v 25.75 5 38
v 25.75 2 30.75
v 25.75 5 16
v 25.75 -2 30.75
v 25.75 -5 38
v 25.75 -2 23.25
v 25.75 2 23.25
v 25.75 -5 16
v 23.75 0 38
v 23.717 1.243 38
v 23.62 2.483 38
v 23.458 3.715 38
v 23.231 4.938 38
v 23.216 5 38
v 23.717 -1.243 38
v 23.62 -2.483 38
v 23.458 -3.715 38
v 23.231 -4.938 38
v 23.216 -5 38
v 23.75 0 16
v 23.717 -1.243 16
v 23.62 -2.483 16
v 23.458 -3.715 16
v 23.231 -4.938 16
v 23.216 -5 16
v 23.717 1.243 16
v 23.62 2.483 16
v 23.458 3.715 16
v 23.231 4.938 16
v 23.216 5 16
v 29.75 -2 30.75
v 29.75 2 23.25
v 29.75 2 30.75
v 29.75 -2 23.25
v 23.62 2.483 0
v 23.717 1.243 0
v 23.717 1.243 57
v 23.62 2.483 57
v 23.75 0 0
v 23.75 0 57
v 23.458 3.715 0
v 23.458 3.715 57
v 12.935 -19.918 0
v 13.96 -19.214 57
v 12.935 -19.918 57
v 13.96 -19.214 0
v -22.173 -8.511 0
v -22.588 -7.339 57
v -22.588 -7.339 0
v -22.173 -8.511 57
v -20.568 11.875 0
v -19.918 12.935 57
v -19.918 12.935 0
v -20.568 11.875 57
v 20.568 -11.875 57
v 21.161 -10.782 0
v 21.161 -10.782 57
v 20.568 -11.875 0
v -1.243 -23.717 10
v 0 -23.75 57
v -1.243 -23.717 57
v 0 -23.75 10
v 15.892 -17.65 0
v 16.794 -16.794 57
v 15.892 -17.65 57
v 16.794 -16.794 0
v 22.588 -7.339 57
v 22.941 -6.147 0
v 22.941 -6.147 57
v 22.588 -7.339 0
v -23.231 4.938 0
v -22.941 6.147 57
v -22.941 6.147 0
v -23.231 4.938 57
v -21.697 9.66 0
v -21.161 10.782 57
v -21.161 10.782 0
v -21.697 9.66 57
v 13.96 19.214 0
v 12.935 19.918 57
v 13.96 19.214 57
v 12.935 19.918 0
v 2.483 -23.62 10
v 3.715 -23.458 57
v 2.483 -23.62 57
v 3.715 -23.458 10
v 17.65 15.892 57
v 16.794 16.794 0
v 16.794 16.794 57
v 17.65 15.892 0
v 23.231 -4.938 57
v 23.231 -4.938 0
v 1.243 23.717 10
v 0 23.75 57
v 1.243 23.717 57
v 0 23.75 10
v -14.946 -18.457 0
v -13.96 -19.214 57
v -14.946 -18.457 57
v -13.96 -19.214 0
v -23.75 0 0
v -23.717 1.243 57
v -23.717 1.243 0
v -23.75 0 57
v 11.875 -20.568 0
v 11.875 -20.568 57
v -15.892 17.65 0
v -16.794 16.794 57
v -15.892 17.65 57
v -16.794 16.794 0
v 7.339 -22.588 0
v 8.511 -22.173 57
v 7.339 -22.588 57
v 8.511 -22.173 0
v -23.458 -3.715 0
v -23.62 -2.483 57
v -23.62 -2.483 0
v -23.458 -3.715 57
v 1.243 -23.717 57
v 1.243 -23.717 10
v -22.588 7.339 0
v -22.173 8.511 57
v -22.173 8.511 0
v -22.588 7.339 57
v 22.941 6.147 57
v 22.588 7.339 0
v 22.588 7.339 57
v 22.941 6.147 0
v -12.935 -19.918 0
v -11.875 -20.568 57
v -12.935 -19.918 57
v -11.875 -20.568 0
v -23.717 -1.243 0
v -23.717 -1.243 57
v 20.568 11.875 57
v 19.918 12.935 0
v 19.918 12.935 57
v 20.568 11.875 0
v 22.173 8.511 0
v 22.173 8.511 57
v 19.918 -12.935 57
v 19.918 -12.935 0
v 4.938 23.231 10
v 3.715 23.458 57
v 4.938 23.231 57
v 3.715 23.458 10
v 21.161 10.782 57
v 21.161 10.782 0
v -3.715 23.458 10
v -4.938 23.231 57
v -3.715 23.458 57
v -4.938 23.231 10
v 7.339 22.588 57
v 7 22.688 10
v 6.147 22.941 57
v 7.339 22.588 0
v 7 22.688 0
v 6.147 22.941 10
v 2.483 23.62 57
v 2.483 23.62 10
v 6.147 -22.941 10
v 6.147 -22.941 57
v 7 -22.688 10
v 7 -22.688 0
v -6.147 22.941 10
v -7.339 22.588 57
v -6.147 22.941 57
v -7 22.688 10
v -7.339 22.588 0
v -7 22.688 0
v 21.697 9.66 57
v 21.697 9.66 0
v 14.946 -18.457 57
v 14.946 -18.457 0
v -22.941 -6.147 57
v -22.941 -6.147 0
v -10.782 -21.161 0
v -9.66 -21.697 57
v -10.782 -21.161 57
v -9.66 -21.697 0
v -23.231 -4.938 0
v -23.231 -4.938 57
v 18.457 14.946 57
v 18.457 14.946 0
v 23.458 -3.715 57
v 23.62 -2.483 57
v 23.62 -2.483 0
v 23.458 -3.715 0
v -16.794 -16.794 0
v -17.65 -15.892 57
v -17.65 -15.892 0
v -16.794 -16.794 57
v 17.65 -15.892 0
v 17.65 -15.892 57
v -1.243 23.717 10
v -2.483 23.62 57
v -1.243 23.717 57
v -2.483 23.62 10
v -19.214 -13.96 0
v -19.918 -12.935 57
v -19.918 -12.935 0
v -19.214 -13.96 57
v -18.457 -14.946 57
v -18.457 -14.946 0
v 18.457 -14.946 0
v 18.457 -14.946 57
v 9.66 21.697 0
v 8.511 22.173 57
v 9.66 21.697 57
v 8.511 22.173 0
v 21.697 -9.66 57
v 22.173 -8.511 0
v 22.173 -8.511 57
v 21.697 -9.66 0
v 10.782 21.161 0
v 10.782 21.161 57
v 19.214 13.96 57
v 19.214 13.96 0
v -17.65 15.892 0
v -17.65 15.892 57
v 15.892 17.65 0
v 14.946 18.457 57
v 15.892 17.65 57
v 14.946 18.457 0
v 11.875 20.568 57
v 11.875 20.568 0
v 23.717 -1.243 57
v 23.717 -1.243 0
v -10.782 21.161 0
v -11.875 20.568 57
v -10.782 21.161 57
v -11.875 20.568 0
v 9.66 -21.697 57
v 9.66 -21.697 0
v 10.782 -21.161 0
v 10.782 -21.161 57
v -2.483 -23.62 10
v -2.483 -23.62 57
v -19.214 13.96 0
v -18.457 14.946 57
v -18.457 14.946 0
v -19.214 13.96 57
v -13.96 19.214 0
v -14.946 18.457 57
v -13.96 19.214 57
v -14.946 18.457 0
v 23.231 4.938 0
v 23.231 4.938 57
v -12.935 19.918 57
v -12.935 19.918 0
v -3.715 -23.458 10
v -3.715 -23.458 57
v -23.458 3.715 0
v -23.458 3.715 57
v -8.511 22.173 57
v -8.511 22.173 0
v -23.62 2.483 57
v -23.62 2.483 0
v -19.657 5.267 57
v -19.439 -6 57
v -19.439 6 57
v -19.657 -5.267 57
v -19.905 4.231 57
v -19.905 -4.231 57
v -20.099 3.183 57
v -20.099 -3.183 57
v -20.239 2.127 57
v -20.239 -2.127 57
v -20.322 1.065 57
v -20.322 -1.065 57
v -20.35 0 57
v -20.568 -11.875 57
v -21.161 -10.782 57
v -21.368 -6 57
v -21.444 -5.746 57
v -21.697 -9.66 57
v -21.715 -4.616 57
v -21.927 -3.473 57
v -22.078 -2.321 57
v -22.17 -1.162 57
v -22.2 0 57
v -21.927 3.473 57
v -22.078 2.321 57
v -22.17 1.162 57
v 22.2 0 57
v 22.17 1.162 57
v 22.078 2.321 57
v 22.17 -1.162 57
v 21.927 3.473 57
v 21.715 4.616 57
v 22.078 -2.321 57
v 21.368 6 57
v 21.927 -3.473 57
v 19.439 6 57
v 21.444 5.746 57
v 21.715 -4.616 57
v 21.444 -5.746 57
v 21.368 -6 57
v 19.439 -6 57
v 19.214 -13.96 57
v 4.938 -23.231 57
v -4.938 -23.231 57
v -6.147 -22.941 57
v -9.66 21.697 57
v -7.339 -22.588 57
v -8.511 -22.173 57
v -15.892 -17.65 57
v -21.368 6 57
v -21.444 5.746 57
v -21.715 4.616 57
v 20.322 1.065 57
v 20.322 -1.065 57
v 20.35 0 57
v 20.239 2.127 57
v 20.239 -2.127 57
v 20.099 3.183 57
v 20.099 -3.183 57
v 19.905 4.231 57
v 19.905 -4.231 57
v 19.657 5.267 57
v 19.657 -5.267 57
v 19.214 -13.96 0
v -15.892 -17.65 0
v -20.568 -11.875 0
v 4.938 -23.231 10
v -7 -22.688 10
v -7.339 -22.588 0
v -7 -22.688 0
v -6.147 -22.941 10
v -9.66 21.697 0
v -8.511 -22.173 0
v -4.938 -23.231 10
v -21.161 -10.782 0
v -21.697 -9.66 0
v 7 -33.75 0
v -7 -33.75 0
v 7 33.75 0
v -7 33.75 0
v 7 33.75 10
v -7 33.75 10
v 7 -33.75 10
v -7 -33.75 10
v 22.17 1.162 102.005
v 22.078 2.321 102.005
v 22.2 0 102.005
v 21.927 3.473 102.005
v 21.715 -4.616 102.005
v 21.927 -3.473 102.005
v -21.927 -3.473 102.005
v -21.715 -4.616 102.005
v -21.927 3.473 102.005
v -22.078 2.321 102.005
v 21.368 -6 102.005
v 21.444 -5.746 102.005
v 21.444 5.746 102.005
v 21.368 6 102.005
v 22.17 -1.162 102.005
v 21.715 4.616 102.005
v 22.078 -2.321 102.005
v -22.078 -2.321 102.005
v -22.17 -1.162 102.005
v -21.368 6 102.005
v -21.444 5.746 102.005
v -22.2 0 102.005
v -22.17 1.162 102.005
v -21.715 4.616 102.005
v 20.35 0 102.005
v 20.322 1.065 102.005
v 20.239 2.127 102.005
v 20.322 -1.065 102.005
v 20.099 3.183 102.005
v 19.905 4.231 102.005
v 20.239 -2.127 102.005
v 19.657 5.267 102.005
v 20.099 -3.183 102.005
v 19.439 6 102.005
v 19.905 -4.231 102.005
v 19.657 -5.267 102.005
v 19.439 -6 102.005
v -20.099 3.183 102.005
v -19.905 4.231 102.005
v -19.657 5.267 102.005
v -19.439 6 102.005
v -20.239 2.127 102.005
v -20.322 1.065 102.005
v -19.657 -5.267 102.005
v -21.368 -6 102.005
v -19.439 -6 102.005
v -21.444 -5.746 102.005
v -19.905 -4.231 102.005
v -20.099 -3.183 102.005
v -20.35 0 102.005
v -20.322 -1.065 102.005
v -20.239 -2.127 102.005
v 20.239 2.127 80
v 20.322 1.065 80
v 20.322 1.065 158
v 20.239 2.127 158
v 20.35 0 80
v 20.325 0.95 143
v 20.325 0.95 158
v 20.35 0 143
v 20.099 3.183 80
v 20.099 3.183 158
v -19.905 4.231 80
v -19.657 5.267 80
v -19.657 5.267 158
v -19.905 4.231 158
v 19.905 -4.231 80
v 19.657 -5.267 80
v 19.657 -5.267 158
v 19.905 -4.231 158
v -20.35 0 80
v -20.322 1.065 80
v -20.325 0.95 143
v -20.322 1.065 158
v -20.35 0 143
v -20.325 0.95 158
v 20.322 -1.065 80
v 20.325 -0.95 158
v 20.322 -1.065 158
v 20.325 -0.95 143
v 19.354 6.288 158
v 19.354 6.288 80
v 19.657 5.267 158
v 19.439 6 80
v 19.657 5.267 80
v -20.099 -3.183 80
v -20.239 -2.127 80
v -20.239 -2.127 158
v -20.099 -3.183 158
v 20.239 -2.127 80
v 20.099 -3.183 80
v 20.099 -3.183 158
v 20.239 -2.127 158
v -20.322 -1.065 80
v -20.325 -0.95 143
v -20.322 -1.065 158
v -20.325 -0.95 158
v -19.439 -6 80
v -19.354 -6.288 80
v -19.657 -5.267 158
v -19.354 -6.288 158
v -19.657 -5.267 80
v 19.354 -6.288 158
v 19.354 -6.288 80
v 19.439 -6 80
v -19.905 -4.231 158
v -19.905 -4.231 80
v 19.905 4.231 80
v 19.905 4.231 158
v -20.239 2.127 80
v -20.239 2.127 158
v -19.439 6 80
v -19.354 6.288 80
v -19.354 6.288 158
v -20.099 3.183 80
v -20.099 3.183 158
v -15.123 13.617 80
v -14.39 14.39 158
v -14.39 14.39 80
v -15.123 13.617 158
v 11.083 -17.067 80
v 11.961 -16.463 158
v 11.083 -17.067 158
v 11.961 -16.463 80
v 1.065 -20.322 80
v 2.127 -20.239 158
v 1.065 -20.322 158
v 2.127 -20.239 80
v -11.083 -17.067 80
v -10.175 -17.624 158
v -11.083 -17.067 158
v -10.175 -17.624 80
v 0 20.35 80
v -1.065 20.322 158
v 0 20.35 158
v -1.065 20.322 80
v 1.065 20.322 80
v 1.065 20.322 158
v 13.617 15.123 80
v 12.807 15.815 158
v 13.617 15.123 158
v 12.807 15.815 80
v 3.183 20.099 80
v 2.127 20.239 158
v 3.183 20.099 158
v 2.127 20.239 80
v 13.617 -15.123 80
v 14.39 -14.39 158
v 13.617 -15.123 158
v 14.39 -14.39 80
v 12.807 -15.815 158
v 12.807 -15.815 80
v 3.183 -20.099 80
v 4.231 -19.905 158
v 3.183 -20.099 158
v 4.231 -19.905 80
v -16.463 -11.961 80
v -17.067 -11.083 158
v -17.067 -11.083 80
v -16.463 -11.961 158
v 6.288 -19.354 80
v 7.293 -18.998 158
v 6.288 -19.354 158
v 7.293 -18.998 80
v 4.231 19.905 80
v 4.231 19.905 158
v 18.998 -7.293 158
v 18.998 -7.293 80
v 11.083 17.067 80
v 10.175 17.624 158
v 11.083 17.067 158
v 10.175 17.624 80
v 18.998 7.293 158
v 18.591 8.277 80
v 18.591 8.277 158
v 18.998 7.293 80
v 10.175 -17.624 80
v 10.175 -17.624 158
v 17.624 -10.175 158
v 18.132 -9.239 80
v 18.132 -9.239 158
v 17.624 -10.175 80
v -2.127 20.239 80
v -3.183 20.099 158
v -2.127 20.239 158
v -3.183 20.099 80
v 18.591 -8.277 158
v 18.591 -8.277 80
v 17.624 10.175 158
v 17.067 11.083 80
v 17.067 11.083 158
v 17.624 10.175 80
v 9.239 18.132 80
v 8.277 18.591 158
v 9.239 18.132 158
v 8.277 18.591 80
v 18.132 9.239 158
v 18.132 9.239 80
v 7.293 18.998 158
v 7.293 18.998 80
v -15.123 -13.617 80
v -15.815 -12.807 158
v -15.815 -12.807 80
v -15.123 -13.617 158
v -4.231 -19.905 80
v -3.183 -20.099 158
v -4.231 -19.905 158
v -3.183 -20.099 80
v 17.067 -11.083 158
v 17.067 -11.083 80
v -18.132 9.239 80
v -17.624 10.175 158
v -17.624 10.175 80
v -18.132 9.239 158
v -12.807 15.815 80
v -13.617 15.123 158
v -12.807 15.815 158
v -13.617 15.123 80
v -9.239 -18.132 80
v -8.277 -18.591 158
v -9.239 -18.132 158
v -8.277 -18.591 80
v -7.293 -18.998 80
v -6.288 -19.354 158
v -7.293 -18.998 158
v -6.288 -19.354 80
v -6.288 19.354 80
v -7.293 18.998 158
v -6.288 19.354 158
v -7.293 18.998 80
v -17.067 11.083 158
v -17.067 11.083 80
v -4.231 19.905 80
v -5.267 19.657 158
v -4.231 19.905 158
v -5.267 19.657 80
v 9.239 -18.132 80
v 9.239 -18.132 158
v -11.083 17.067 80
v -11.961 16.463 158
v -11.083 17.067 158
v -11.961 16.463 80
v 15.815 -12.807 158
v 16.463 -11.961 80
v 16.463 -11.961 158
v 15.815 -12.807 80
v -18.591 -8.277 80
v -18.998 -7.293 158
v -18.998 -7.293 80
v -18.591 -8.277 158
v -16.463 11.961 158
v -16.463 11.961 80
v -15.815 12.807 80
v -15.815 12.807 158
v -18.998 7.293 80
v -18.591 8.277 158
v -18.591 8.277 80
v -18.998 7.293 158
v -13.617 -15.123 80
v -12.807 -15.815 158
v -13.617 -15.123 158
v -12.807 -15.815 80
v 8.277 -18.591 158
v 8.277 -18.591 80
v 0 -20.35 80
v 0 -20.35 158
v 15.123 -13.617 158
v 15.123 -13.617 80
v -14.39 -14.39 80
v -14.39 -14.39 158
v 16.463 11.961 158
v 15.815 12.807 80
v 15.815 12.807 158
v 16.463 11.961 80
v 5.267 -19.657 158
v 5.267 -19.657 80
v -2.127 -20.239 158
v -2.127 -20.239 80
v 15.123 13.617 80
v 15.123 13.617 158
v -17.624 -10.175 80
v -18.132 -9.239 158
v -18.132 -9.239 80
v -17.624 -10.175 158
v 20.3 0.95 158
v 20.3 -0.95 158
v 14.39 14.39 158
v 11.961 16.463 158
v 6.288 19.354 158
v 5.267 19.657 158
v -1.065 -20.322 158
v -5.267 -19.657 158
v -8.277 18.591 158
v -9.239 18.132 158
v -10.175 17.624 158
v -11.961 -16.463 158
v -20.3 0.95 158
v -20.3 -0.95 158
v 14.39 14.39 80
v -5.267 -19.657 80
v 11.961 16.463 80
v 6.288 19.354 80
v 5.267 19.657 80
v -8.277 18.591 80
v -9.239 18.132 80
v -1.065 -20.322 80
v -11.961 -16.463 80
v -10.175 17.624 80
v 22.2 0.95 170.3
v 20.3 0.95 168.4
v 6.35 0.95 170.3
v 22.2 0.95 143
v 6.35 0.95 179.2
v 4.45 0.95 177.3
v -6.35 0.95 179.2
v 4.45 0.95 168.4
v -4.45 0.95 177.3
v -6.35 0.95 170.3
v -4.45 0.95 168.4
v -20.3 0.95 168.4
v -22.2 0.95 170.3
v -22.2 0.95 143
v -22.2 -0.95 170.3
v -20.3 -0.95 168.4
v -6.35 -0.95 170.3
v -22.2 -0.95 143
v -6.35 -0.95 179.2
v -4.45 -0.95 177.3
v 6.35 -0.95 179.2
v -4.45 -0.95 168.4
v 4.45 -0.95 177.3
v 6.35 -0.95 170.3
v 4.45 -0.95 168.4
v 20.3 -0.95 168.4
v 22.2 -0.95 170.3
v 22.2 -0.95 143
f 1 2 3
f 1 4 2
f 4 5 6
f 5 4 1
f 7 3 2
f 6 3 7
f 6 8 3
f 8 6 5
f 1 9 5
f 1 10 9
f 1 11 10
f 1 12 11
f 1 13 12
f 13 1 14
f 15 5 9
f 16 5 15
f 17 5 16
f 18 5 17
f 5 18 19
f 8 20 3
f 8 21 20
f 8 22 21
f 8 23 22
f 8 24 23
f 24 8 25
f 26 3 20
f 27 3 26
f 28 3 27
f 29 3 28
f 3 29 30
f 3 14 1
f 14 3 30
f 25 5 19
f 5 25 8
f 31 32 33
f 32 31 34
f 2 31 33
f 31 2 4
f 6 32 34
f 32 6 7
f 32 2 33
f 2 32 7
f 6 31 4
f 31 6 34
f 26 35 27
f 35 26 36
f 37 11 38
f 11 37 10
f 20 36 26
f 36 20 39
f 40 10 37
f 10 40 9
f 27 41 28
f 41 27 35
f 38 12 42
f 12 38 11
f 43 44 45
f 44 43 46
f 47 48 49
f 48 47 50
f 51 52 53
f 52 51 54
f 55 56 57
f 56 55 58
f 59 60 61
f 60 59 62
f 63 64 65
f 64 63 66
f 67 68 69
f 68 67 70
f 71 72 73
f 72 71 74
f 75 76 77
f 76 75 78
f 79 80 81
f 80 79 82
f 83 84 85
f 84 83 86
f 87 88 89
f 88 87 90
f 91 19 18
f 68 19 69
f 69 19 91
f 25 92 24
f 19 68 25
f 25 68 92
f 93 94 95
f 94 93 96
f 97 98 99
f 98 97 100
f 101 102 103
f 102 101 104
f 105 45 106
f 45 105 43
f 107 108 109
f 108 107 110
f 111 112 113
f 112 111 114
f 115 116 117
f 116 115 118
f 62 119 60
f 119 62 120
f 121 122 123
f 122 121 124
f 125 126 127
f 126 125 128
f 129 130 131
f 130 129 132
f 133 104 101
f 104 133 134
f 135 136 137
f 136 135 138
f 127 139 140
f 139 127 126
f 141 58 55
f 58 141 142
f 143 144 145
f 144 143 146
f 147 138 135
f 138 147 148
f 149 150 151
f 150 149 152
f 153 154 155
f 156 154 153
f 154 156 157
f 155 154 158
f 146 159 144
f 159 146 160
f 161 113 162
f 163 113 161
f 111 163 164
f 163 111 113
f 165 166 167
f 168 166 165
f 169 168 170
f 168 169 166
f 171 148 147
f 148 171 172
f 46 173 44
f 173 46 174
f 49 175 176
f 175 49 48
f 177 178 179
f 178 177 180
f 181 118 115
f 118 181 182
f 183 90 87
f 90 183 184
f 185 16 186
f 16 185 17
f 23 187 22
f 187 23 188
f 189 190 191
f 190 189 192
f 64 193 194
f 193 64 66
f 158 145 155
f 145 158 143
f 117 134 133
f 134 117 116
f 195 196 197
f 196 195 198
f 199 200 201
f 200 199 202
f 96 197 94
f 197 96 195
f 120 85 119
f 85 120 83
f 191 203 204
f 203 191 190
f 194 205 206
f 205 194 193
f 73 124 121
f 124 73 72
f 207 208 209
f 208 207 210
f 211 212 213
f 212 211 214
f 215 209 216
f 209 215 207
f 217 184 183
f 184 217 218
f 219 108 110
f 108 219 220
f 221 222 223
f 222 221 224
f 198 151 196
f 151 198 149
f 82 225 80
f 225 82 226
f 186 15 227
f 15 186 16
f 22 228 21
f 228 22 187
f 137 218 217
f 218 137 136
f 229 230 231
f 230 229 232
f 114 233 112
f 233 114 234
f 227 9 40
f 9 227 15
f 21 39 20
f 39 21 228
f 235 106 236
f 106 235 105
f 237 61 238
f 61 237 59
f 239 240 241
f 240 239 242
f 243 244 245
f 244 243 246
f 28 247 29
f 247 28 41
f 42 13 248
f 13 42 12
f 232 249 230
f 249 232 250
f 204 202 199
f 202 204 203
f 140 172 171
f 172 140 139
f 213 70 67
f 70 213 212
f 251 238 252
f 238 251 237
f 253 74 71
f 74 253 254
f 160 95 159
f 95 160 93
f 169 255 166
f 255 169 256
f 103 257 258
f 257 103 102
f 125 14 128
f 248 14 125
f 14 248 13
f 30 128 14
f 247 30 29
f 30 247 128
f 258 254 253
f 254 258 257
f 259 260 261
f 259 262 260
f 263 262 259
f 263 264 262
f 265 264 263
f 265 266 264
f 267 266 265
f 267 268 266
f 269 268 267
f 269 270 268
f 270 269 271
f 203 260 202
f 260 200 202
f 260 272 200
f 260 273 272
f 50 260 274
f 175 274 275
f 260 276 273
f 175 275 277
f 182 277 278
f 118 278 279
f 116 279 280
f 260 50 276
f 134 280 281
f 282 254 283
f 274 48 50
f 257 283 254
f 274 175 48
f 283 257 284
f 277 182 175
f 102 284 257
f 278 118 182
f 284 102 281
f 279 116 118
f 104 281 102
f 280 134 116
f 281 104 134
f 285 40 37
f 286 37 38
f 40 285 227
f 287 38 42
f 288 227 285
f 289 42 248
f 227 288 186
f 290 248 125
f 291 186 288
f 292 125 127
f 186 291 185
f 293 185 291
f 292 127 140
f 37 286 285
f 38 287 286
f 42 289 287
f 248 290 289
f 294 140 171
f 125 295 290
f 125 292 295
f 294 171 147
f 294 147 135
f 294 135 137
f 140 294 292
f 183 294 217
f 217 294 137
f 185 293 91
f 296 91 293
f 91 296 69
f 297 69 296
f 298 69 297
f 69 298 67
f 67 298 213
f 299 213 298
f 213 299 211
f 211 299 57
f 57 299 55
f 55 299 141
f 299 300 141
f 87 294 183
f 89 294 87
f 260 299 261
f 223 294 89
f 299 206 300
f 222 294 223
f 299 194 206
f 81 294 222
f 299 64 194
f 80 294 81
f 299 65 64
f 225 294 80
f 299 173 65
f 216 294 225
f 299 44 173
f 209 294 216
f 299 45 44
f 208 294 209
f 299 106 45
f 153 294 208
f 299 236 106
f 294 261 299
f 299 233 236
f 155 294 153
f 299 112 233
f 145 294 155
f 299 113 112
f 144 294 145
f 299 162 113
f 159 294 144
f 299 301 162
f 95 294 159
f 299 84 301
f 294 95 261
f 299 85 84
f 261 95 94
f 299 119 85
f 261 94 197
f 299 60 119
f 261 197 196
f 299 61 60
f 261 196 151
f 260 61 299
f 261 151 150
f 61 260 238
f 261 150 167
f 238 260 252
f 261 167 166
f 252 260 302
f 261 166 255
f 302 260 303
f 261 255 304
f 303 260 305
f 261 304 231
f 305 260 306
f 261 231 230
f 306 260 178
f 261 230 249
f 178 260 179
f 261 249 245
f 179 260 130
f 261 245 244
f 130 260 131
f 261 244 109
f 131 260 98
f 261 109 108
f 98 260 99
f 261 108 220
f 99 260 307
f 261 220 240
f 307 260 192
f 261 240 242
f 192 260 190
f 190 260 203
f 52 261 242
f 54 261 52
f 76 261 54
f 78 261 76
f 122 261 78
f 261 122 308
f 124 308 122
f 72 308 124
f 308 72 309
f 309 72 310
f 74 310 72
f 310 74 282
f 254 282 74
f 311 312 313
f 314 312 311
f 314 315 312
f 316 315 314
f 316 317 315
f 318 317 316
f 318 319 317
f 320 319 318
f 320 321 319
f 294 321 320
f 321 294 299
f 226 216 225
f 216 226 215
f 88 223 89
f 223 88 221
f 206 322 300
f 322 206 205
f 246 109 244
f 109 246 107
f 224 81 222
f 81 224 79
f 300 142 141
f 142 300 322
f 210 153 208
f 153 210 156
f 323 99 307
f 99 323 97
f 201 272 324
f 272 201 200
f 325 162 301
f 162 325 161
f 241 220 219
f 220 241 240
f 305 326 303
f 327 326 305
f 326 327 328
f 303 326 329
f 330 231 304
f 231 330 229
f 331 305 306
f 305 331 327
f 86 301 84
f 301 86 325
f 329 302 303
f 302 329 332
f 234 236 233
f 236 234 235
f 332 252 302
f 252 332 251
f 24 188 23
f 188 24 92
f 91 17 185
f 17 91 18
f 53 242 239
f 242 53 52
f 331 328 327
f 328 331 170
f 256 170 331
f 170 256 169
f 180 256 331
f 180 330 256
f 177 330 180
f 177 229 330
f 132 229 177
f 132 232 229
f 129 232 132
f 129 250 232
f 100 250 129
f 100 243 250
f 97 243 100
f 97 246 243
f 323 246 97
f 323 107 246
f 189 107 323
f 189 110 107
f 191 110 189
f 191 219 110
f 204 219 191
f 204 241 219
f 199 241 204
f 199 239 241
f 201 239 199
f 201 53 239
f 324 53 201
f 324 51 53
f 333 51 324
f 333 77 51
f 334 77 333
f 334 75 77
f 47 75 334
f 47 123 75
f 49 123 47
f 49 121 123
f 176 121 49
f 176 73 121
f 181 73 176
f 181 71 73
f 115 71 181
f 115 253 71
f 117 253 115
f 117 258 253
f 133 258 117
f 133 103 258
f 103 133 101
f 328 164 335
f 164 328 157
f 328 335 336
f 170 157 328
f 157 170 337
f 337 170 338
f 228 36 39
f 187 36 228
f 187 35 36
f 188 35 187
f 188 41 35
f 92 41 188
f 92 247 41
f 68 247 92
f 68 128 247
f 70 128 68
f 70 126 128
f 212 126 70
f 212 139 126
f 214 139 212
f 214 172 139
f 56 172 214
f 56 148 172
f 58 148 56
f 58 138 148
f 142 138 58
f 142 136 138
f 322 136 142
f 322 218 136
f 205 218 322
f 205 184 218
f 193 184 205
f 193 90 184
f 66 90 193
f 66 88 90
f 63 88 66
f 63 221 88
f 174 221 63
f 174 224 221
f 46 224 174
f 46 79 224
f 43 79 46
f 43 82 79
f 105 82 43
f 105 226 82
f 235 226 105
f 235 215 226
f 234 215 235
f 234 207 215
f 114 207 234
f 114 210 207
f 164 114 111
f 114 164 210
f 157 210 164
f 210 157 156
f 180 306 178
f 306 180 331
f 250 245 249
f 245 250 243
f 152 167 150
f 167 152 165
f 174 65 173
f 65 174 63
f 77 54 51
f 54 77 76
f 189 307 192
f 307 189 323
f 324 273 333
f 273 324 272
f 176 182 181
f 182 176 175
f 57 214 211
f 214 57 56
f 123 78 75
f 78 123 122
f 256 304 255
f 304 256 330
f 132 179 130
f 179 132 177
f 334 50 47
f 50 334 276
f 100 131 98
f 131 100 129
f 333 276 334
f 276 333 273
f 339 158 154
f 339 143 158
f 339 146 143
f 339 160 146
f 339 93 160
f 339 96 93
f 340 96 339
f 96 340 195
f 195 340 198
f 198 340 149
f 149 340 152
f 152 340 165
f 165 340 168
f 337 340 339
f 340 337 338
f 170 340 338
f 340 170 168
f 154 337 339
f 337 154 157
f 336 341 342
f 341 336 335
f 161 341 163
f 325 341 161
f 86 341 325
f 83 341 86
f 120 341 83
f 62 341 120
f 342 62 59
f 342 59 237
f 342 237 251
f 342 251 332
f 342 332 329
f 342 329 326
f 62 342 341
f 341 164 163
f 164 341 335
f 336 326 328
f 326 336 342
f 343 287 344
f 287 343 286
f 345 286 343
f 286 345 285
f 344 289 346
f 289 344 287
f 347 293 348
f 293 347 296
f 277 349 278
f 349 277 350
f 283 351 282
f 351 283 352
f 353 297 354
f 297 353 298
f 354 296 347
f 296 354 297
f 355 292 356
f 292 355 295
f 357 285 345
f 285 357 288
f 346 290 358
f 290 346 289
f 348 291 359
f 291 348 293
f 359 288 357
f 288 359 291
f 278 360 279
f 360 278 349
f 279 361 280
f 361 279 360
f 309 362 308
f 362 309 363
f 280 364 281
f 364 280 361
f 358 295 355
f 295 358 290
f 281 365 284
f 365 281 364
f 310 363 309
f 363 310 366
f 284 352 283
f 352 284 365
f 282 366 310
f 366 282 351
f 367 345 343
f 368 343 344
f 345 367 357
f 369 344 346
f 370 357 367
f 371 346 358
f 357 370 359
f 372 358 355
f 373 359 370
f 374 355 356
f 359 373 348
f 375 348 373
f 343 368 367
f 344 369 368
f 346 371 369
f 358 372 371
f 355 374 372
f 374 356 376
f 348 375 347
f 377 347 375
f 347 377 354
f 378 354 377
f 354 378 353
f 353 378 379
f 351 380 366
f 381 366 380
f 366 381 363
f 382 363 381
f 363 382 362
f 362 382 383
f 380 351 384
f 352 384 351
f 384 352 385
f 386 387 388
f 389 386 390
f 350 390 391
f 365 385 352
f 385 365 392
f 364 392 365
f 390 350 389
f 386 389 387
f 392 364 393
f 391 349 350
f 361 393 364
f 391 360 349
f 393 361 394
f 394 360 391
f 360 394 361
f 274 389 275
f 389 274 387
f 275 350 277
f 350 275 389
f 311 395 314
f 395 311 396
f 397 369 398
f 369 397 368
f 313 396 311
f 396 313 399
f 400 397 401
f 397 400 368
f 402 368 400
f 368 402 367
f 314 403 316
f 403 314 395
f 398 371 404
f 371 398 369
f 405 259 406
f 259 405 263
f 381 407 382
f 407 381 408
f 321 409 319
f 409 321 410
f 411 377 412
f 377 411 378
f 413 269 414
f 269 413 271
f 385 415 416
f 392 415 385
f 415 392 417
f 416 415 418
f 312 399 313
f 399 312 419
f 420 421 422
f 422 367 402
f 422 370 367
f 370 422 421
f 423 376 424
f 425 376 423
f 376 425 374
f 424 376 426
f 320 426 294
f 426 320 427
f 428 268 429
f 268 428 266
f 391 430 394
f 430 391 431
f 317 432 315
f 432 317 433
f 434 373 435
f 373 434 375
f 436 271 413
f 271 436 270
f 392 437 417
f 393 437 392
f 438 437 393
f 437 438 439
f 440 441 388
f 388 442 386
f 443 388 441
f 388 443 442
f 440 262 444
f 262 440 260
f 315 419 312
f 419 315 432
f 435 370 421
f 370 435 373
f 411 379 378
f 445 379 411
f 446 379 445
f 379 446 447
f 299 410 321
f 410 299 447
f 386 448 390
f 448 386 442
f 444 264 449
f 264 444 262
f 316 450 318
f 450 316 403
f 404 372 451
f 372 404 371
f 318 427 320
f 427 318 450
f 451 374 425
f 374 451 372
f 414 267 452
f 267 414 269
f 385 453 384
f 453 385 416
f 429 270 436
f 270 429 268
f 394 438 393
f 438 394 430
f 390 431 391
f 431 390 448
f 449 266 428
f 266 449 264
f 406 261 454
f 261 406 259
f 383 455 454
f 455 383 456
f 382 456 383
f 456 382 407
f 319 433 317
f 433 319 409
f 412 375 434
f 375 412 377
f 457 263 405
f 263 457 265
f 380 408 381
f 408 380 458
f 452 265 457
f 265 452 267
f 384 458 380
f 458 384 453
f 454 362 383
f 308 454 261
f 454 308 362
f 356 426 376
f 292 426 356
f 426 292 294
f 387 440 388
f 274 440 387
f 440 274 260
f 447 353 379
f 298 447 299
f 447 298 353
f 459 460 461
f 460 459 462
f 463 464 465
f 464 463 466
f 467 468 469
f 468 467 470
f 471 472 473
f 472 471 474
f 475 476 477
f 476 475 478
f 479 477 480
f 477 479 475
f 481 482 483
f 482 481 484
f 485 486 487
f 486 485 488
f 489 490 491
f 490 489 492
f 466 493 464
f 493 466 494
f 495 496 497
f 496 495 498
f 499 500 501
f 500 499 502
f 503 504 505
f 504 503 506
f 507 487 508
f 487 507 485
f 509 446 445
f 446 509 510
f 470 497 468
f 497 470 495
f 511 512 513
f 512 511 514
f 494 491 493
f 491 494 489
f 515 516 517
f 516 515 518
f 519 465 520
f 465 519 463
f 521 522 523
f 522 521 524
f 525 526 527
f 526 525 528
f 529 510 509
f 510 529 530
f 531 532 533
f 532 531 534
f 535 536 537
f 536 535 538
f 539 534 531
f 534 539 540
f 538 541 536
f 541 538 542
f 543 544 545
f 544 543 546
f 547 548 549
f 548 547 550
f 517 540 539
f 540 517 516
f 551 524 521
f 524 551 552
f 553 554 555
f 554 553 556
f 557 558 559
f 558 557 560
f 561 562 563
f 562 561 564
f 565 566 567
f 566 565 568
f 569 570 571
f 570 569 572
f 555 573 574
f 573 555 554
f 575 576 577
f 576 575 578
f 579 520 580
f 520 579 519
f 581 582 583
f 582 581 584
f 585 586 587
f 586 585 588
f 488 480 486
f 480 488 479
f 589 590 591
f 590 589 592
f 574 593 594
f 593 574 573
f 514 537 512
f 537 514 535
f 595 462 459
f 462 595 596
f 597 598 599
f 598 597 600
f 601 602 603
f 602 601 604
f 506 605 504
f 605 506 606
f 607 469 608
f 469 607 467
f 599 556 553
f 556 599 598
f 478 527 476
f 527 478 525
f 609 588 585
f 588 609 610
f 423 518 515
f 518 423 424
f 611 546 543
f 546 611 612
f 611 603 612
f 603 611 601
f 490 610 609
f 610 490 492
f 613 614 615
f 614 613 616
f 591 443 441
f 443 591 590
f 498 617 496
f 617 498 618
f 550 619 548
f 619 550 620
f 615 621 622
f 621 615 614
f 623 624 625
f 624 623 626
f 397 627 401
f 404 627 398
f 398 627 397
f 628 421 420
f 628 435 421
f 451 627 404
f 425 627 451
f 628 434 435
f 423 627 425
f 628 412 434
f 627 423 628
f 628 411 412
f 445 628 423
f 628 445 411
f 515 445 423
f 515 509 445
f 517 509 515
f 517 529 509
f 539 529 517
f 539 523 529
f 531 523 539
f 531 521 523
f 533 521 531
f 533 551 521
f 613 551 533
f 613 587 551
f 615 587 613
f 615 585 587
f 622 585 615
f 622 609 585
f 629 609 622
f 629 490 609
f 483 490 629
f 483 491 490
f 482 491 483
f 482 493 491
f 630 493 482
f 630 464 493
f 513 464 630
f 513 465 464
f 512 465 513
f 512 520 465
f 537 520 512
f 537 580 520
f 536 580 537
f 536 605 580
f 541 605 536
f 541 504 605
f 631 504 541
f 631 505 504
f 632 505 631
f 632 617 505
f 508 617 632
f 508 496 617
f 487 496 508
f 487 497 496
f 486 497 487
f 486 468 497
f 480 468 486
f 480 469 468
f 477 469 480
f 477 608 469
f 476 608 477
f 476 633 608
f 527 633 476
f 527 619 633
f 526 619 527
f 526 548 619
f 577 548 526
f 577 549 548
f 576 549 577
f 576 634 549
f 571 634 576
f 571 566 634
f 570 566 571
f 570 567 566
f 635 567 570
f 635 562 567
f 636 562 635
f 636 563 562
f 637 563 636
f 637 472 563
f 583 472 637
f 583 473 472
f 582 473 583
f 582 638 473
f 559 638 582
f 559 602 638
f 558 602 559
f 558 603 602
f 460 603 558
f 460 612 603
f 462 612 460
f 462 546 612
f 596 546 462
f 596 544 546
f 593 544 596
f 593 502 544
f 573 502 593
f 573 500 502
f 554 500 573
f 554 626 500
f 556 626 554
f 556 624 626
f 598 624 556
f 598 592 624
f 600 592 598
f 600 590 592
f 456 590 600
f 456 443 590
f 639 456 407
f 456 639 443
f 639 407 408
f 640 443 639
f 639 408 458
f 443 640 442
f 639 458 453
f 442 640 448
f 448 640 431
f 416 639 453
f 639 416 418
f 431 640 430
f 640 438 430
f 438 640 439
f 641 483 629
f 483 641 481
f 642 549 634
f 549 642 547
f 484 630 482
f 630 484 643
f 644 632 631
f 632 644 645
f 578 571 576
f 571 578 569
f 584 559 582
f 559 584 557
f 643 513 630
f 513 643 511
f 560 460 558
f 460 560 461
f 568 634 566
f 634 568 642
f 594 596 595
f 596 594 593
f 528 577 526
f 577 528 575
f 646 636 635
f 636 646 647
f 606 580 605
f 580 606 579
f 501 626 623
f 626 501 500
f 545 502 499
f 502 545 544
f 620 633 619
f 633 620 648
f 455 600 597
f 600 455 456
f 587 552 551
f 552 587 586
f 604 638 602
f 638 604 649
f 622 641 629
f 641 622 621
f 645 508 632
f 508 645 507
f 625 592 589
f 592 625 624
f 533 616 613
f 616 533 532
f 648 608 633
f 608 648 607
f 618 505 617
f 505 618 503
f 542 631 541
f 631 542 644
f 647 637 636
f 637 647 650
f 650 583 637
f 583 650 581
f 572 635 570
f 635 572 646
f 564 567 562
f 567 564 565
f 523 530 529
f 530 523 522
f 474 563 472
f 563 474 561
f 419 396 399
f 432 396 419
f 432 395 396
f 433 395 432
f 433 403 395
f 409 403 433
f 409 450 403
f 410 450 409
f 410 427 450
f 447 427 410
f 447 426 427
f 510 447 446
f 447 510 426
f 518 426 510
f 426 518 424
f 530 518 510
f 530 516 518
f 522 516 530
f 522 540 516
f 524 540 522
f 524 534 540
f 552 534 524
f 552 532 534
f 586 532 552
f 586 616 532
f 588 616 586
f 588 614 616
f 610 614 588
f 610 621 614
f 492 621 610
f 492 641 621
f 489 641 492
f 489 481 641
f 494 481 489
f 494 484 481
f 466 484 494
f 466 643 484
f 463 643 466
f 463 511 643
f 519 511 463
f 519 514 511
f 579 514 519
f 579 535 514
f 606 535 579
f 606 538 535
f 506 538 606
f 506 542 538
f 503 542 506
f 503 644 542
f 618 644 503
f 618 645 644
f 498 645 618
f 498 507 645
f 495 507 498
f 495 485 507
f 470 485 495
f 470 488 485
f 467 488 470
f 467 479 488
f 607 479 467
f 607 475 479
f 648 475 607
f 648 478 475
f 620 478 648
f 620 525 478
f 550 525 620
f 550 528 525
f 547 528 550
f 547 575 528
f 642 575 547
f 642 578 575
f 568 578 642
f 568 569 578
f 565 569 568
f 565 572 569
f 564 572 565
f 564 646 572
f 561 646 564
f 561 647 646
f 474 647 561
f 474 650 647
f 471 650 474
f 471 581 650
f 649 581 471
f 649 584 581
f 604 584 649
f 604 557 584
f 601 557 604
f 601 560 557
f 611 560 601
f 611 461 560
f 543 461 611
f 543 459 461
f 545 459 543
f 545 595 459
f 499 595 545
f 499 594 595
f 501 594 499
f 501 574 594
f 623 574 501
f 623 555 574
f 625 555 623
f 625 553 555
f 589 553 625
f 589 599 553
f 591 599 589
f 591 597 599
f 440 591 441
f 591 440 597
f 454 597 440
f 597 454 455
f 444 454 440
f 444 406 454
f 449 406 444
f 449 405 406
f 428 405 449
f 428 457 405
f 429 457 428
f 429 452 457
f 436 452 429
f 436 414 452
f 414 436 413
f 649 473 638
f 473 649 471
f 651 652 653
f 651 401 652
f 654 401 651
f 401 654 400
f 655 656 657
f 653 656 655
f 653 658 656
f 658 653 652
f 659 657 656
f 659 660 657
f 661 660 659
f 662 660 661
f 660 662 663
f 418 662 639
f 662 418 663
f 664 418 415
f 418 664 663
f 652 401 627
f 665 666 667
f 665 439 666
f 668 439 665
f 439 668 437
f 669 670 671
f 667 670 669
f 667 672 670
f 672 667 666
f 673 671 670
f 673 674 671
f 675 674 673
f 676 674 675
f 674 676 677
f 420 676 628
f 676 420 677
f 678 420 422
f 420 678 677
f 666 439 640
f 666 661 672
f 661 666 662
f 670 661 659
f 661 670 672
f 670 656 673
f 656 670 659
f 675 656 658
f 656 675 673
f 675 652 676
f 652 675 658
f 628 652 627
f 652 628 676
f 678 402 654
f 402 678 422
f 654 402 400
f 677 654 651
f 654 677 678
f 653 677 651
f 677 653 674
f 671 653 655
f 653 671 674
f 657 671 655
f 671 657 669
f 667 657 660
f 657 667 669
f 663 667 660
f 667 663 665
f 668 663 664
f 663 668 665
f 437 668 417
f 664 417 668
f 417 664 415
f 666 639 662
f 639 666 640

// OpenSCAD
dMotor = 47.5;
hMotor = 57;

dGap = 44.4;
hGap = 23;
wGapClamp = 12; // guess
hGapClampOverlap = 22; // guess

dBattery = 40.7;
hBattery = 78;

hHanger = 21.2;
hHangerHor = 12.3;
dHanger = 1.9;
hHangerOverlap = 15;
wHanger = 44.4;
wHangerEar = 12.7;

lMount = 10;
wMount = 14;
hMount = 10;

hSwitchSocket = 22;
wSwitchSocket = 10; // guess
lSwitchSocket = 2;//guess
hSwitch = 7.5;
wSwitch = 4;//guess
lSwitch = 4;//guess
hSwitchSocketPosition = 16; // guess
aSwitchSocketPosition = 0; //guess


module endOfParameters() {};

cadFix = 0.005;
module cadOffset() {
    translate([0, 0, - cadFix]) children();
}

module lift(h) {
    translate([0, 0, h]) children();
}

$fn = 120;

module mount(aHorizontal) {
    lDistanceFromCenter = dMotor / 2;
    lBridgeToMotor = lMount;
    lMountWithBridgeToMotor = lMount + lBridgeToMotor;
    rotate([0, 0, aHorizontal])
        translate([lDistanceFromCenter - lBridgeToMotor, - wMount / 2, 0])
            cube([lMountWithBridgeToMotor, wMount, hMount]);
}

module switch() {
    lBridgeToMotor = lSwitchSocket;
    module socketWithLever() {
        lSocketModel = lBridgeToMotor + lSwitchSocket;
        cube([lSocketModel, wSwitchSocket, hSwitchSocket]);
        translate([lSocketModel - cadFix,
                (wSwitchSocket - wSwitch) / 2, (hSwitchSocket - hSwitch) / 2])
            cube([lSwitch + cadFix, wSwitch, hSwitch]);
    }

    translate([dMotor / 2 - lBridgeToMotor, - wSwitchSocket / 2, hSwitchSocketPosition])
        socketWithLever();
}

module motor() {
    cylinder(hMotor, d = dMotor);
    mount(90);
    mount(- 90);
    switch();
}

module gap() {
    hGapClampCad = hGap + hGapClampOverlap + 2 * cadFix;
    lMask = dMotor;
    wMask = dGap / 2;
    hMask = hGapClampCad+ 2* cadFix;
    cadOffset()
        difference() {
            cylinder(hGapClampCad, d = dGap);
            cadOffset() cylinder(hGapClampCad , d = dBattery);
            translate([-lMask/2, wGapClamp/2, -cadFix])
                cube([lMask, wMask, hMask]);
            translate([-lMask/2, - wGapClamp/2 -wMask, -cadFix])
                cube([lMask, wMask, hMask]);
        }
}

module battery() {
    cylinder(hBattery, d = dBattery);
}

module hanger() {
    shape = [
            [0, 0],
            [0, hHangerOverlap + hHangerHor],
            [(wHanger - wHangerEar) / 2, hHangerOverlap + hHangerHor],
            [(wHanger - wHangerEar) / 2, hHangerOverlap + hHanger],
            [(wHanger + wHangerEar) / 2, hHangerOverlap + hHanger],
            [(wHanger + wHangerEar) / 2, hHangerOverlap + hHangerHor],
            [wHanger, hHangerOverlap + hHangerHor],
            [wHanger, 0],
            [wHanger - dHanger, 0],
            [wHanger - dHanger, hHangerOverlap + hHangerHor - dHanger],
            [(wHanger + wHangerEar) / 2 - dHanger, hHangerOverlap + hHangerHor - dHanger],
            [(wHanger + wHangerEar) / 2 - dHanger, hHangerOverlap + hHanger - dHanger],
            [(wHanger - wHangerEar) / 2 + dHanger, hHangerOverlap + hHanger - dHanger],
            [(wHanger - wHangerEar) / 2 + dHanger, hHangerOverlap + hHangerHor - dHanger],
            [dHanger, hHangerOverlap + hHangerHor - dHanger],
            [dHanger, 0]
        ];
    translate([- wHanger / 2, dHanger / 2, - hHangerOverlap])
        rotate([90, 0, 0])
            linear_extrude(dHanger) {polygon(shape);}
}

module mirrorBallMotor() {
    motor();
    lift(hMotor)
    gap();
    lift(hMotor + hGap)
    battery();
    lift(hMotor + hGap + hBattery)
    hanger();
}

mirrorBallMotor();
